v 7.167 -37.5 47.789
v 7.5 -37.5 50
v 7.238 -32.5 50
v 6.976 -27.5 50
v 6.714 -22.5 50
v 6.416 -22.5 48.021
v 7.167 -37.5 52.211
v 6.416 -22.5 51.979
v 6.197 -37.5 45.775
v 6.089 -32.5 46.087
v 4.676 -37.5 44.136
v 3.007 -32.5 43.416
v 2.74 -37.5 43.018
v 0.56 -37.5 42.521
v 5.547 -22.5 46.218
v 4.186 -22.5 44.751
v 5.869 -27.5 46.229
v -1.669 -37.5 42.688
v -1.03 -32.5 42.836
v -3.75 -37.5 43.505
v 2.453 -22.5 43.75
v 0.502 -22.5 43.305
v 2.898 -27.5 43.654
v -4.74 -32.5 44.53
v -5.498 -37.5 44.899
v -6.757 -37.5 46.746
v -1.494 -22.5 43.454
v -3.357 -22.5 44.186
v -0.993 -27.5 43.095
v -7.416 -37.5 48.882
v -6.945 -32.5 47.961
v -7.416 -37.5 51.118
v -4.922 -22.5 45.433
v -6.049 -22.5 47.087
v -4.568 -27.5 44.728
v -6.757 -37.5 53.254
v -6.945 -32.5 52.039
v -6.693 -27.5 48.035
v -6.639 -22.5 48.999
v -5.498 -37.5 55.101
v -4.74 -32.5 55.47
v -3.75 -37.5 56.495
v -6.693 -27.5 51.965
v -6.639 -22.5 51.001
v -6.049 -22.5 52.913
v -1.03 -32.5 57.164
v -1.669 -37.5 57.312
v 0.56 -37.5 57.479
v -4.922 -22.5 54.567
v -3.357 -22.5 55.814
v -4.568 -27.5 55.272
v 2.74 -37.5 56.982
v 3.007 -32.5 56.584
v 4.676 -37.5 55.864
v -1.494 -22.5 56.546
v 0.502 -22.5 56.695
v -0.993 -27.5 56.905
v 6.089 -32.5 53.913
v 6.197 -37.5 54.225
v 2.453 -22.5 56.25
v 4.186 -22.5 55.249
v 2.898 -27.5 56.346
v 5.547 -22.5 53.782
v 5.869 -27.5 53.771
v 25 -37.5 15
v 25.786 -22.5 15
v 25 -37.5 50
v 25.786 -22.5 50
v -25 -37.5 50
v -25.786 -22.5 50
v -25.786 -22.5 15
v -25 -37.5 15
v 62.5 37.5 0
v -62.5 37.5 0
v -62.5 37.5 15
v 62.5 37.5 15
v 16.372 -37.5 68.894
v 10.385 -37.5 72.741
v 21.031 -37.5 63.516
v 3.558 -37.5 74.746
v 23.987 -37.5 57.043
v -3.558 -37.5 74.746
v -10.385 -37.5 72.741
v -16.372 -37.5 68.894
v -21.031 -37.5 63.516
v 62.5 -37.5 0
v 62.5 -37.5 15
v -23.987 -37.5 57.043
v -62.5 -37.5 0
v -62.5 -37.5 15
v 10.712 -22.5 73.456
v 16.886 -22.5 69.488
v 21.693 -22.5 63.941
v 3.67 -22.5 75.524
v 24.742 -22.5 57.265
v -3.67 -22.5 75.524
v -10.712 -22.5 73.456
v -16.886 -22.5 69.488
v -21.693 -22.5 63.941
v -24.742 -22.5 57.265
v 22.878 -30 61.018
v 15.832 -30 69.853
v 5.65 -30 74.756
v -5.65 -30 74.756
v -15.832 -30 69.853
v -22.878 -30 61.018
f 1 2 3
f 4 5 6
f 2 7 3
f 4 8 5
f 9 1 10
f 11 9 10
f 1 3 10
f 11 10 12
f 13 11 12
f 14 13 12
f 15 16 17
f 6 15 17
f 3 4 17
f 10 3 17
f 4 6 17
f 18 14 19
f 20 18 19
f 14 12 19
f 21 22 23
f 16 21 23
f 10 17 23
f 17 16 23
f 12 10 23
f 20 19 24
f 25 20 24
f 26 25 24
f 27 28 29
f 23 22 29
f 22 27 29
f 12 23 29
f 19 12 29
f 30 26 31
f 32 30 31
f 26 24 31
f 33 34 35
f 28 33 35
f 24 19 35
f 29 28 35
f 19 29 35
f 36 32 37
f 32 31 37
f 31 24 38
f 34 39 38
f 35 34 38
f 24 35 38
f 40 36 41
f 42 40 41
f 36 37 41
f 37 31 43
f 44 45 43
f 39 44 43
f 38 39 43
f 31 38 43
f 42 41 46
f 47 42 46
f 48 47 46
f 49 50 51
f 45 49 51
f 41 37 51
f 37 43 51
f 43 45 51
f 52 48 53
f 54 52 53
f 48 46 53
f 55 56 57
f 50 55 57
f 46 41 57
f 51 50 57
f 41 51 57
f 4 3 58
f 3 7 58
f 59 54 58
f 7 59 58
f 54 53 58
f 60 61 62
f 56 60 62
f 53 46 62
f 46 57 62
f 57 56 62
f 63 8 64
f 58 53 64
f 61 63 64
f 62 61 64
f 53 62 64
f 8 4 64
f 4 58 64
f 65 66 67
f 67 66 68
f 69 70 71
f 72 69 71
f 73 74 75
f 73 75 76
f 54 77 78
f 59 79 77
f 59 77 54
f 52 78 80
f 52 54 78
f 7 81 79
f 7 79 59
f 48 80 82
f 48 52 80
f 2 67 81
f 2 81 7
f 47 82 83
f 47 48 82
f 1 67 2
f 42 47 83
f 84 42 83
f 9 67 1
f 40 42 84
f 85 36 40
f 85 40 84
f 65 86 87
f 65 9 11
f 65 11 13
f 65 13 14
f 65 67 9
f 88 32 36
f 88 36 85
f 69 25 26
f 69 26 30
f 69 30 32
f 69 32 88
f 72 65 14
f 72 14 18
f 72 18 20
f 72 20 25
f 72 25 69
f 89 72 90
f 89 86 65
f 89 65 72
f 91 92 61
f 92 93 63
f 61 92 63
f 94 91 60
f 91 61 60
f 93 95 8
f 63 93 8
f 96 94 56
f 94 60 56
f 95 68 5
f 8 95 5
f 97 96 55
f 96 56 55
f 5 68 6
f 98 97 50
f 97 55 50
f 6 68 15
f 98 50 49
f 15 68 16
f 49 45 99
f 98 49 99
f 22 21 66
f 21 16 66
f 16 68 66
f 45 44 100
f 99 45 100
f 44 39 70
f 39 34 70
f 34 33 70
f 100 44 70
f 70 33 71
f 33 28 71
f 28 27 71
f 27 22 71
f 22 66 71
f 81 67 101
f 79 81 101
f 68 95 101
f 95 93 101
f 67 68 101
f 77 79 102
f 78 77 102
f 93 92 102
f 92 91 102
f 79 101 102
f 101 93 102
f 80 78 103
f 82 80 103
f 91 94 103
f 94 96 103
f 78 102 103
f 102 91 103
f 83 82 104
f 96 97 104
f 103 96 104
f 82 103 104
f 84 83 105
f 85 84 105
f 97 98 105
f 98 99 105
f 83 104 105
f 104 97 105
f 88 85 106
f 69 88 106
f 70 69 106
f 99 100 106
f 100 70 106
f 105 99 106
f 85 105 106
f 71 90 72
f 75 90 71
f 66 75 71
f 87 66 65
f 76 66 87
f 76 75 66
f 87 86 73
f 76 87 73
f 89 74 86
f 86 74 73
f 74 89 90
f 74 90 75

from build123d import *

# Parameters (mm, degrees)
F0_W     = 125
F0_H     = 75
F1_DEPTH = 15
F3_DEPTH = 15
F3_TAPER = -3


with BuildPart() as f1:
    # F0 (on Top) → F1 (new body)
    with BuildSketch(Plane.XY):
        Rectangle(F0_W, F0_H)
    extrude(amount=F1_DEPTH)

    # F2 (on face) → F3 (join)
    with BuildSketch(Plane.XZ.offset(37.5)):
        with BuildLine():
            Line((7.5, 50), (25, 50))
            ThreePointArc((25, 50), (0, 75), (-25, 50))
            Line((-25, 50), (-7.5, 50))
            ThreePointArc((-7.5, 50), (0, 57.5), (7.5, 50))
        make_face()
        with BuildLine():
            ThreePointArc((-25, 50), (0, 25), (25, 50))
            Line((25, 50), (7.5, 50))
            ThreePointArc((7.5, 50), (0, 42.5), (-7.5, 50))
            Line((-7.5, 50), (-25, 50))
        make_face()
        with BuildLine():
            Line((25, 15), (25, 50))
            ThreePointArc((25, 50), (0, 25), (-25, 50))
            Line((-25, 50), (-25, 15))
            Line((-25, 15), (25, 15))
        make_face()
    extrude(amount=-F3_DEPTH, taper=F3_TAPER)


solid = f1.part
